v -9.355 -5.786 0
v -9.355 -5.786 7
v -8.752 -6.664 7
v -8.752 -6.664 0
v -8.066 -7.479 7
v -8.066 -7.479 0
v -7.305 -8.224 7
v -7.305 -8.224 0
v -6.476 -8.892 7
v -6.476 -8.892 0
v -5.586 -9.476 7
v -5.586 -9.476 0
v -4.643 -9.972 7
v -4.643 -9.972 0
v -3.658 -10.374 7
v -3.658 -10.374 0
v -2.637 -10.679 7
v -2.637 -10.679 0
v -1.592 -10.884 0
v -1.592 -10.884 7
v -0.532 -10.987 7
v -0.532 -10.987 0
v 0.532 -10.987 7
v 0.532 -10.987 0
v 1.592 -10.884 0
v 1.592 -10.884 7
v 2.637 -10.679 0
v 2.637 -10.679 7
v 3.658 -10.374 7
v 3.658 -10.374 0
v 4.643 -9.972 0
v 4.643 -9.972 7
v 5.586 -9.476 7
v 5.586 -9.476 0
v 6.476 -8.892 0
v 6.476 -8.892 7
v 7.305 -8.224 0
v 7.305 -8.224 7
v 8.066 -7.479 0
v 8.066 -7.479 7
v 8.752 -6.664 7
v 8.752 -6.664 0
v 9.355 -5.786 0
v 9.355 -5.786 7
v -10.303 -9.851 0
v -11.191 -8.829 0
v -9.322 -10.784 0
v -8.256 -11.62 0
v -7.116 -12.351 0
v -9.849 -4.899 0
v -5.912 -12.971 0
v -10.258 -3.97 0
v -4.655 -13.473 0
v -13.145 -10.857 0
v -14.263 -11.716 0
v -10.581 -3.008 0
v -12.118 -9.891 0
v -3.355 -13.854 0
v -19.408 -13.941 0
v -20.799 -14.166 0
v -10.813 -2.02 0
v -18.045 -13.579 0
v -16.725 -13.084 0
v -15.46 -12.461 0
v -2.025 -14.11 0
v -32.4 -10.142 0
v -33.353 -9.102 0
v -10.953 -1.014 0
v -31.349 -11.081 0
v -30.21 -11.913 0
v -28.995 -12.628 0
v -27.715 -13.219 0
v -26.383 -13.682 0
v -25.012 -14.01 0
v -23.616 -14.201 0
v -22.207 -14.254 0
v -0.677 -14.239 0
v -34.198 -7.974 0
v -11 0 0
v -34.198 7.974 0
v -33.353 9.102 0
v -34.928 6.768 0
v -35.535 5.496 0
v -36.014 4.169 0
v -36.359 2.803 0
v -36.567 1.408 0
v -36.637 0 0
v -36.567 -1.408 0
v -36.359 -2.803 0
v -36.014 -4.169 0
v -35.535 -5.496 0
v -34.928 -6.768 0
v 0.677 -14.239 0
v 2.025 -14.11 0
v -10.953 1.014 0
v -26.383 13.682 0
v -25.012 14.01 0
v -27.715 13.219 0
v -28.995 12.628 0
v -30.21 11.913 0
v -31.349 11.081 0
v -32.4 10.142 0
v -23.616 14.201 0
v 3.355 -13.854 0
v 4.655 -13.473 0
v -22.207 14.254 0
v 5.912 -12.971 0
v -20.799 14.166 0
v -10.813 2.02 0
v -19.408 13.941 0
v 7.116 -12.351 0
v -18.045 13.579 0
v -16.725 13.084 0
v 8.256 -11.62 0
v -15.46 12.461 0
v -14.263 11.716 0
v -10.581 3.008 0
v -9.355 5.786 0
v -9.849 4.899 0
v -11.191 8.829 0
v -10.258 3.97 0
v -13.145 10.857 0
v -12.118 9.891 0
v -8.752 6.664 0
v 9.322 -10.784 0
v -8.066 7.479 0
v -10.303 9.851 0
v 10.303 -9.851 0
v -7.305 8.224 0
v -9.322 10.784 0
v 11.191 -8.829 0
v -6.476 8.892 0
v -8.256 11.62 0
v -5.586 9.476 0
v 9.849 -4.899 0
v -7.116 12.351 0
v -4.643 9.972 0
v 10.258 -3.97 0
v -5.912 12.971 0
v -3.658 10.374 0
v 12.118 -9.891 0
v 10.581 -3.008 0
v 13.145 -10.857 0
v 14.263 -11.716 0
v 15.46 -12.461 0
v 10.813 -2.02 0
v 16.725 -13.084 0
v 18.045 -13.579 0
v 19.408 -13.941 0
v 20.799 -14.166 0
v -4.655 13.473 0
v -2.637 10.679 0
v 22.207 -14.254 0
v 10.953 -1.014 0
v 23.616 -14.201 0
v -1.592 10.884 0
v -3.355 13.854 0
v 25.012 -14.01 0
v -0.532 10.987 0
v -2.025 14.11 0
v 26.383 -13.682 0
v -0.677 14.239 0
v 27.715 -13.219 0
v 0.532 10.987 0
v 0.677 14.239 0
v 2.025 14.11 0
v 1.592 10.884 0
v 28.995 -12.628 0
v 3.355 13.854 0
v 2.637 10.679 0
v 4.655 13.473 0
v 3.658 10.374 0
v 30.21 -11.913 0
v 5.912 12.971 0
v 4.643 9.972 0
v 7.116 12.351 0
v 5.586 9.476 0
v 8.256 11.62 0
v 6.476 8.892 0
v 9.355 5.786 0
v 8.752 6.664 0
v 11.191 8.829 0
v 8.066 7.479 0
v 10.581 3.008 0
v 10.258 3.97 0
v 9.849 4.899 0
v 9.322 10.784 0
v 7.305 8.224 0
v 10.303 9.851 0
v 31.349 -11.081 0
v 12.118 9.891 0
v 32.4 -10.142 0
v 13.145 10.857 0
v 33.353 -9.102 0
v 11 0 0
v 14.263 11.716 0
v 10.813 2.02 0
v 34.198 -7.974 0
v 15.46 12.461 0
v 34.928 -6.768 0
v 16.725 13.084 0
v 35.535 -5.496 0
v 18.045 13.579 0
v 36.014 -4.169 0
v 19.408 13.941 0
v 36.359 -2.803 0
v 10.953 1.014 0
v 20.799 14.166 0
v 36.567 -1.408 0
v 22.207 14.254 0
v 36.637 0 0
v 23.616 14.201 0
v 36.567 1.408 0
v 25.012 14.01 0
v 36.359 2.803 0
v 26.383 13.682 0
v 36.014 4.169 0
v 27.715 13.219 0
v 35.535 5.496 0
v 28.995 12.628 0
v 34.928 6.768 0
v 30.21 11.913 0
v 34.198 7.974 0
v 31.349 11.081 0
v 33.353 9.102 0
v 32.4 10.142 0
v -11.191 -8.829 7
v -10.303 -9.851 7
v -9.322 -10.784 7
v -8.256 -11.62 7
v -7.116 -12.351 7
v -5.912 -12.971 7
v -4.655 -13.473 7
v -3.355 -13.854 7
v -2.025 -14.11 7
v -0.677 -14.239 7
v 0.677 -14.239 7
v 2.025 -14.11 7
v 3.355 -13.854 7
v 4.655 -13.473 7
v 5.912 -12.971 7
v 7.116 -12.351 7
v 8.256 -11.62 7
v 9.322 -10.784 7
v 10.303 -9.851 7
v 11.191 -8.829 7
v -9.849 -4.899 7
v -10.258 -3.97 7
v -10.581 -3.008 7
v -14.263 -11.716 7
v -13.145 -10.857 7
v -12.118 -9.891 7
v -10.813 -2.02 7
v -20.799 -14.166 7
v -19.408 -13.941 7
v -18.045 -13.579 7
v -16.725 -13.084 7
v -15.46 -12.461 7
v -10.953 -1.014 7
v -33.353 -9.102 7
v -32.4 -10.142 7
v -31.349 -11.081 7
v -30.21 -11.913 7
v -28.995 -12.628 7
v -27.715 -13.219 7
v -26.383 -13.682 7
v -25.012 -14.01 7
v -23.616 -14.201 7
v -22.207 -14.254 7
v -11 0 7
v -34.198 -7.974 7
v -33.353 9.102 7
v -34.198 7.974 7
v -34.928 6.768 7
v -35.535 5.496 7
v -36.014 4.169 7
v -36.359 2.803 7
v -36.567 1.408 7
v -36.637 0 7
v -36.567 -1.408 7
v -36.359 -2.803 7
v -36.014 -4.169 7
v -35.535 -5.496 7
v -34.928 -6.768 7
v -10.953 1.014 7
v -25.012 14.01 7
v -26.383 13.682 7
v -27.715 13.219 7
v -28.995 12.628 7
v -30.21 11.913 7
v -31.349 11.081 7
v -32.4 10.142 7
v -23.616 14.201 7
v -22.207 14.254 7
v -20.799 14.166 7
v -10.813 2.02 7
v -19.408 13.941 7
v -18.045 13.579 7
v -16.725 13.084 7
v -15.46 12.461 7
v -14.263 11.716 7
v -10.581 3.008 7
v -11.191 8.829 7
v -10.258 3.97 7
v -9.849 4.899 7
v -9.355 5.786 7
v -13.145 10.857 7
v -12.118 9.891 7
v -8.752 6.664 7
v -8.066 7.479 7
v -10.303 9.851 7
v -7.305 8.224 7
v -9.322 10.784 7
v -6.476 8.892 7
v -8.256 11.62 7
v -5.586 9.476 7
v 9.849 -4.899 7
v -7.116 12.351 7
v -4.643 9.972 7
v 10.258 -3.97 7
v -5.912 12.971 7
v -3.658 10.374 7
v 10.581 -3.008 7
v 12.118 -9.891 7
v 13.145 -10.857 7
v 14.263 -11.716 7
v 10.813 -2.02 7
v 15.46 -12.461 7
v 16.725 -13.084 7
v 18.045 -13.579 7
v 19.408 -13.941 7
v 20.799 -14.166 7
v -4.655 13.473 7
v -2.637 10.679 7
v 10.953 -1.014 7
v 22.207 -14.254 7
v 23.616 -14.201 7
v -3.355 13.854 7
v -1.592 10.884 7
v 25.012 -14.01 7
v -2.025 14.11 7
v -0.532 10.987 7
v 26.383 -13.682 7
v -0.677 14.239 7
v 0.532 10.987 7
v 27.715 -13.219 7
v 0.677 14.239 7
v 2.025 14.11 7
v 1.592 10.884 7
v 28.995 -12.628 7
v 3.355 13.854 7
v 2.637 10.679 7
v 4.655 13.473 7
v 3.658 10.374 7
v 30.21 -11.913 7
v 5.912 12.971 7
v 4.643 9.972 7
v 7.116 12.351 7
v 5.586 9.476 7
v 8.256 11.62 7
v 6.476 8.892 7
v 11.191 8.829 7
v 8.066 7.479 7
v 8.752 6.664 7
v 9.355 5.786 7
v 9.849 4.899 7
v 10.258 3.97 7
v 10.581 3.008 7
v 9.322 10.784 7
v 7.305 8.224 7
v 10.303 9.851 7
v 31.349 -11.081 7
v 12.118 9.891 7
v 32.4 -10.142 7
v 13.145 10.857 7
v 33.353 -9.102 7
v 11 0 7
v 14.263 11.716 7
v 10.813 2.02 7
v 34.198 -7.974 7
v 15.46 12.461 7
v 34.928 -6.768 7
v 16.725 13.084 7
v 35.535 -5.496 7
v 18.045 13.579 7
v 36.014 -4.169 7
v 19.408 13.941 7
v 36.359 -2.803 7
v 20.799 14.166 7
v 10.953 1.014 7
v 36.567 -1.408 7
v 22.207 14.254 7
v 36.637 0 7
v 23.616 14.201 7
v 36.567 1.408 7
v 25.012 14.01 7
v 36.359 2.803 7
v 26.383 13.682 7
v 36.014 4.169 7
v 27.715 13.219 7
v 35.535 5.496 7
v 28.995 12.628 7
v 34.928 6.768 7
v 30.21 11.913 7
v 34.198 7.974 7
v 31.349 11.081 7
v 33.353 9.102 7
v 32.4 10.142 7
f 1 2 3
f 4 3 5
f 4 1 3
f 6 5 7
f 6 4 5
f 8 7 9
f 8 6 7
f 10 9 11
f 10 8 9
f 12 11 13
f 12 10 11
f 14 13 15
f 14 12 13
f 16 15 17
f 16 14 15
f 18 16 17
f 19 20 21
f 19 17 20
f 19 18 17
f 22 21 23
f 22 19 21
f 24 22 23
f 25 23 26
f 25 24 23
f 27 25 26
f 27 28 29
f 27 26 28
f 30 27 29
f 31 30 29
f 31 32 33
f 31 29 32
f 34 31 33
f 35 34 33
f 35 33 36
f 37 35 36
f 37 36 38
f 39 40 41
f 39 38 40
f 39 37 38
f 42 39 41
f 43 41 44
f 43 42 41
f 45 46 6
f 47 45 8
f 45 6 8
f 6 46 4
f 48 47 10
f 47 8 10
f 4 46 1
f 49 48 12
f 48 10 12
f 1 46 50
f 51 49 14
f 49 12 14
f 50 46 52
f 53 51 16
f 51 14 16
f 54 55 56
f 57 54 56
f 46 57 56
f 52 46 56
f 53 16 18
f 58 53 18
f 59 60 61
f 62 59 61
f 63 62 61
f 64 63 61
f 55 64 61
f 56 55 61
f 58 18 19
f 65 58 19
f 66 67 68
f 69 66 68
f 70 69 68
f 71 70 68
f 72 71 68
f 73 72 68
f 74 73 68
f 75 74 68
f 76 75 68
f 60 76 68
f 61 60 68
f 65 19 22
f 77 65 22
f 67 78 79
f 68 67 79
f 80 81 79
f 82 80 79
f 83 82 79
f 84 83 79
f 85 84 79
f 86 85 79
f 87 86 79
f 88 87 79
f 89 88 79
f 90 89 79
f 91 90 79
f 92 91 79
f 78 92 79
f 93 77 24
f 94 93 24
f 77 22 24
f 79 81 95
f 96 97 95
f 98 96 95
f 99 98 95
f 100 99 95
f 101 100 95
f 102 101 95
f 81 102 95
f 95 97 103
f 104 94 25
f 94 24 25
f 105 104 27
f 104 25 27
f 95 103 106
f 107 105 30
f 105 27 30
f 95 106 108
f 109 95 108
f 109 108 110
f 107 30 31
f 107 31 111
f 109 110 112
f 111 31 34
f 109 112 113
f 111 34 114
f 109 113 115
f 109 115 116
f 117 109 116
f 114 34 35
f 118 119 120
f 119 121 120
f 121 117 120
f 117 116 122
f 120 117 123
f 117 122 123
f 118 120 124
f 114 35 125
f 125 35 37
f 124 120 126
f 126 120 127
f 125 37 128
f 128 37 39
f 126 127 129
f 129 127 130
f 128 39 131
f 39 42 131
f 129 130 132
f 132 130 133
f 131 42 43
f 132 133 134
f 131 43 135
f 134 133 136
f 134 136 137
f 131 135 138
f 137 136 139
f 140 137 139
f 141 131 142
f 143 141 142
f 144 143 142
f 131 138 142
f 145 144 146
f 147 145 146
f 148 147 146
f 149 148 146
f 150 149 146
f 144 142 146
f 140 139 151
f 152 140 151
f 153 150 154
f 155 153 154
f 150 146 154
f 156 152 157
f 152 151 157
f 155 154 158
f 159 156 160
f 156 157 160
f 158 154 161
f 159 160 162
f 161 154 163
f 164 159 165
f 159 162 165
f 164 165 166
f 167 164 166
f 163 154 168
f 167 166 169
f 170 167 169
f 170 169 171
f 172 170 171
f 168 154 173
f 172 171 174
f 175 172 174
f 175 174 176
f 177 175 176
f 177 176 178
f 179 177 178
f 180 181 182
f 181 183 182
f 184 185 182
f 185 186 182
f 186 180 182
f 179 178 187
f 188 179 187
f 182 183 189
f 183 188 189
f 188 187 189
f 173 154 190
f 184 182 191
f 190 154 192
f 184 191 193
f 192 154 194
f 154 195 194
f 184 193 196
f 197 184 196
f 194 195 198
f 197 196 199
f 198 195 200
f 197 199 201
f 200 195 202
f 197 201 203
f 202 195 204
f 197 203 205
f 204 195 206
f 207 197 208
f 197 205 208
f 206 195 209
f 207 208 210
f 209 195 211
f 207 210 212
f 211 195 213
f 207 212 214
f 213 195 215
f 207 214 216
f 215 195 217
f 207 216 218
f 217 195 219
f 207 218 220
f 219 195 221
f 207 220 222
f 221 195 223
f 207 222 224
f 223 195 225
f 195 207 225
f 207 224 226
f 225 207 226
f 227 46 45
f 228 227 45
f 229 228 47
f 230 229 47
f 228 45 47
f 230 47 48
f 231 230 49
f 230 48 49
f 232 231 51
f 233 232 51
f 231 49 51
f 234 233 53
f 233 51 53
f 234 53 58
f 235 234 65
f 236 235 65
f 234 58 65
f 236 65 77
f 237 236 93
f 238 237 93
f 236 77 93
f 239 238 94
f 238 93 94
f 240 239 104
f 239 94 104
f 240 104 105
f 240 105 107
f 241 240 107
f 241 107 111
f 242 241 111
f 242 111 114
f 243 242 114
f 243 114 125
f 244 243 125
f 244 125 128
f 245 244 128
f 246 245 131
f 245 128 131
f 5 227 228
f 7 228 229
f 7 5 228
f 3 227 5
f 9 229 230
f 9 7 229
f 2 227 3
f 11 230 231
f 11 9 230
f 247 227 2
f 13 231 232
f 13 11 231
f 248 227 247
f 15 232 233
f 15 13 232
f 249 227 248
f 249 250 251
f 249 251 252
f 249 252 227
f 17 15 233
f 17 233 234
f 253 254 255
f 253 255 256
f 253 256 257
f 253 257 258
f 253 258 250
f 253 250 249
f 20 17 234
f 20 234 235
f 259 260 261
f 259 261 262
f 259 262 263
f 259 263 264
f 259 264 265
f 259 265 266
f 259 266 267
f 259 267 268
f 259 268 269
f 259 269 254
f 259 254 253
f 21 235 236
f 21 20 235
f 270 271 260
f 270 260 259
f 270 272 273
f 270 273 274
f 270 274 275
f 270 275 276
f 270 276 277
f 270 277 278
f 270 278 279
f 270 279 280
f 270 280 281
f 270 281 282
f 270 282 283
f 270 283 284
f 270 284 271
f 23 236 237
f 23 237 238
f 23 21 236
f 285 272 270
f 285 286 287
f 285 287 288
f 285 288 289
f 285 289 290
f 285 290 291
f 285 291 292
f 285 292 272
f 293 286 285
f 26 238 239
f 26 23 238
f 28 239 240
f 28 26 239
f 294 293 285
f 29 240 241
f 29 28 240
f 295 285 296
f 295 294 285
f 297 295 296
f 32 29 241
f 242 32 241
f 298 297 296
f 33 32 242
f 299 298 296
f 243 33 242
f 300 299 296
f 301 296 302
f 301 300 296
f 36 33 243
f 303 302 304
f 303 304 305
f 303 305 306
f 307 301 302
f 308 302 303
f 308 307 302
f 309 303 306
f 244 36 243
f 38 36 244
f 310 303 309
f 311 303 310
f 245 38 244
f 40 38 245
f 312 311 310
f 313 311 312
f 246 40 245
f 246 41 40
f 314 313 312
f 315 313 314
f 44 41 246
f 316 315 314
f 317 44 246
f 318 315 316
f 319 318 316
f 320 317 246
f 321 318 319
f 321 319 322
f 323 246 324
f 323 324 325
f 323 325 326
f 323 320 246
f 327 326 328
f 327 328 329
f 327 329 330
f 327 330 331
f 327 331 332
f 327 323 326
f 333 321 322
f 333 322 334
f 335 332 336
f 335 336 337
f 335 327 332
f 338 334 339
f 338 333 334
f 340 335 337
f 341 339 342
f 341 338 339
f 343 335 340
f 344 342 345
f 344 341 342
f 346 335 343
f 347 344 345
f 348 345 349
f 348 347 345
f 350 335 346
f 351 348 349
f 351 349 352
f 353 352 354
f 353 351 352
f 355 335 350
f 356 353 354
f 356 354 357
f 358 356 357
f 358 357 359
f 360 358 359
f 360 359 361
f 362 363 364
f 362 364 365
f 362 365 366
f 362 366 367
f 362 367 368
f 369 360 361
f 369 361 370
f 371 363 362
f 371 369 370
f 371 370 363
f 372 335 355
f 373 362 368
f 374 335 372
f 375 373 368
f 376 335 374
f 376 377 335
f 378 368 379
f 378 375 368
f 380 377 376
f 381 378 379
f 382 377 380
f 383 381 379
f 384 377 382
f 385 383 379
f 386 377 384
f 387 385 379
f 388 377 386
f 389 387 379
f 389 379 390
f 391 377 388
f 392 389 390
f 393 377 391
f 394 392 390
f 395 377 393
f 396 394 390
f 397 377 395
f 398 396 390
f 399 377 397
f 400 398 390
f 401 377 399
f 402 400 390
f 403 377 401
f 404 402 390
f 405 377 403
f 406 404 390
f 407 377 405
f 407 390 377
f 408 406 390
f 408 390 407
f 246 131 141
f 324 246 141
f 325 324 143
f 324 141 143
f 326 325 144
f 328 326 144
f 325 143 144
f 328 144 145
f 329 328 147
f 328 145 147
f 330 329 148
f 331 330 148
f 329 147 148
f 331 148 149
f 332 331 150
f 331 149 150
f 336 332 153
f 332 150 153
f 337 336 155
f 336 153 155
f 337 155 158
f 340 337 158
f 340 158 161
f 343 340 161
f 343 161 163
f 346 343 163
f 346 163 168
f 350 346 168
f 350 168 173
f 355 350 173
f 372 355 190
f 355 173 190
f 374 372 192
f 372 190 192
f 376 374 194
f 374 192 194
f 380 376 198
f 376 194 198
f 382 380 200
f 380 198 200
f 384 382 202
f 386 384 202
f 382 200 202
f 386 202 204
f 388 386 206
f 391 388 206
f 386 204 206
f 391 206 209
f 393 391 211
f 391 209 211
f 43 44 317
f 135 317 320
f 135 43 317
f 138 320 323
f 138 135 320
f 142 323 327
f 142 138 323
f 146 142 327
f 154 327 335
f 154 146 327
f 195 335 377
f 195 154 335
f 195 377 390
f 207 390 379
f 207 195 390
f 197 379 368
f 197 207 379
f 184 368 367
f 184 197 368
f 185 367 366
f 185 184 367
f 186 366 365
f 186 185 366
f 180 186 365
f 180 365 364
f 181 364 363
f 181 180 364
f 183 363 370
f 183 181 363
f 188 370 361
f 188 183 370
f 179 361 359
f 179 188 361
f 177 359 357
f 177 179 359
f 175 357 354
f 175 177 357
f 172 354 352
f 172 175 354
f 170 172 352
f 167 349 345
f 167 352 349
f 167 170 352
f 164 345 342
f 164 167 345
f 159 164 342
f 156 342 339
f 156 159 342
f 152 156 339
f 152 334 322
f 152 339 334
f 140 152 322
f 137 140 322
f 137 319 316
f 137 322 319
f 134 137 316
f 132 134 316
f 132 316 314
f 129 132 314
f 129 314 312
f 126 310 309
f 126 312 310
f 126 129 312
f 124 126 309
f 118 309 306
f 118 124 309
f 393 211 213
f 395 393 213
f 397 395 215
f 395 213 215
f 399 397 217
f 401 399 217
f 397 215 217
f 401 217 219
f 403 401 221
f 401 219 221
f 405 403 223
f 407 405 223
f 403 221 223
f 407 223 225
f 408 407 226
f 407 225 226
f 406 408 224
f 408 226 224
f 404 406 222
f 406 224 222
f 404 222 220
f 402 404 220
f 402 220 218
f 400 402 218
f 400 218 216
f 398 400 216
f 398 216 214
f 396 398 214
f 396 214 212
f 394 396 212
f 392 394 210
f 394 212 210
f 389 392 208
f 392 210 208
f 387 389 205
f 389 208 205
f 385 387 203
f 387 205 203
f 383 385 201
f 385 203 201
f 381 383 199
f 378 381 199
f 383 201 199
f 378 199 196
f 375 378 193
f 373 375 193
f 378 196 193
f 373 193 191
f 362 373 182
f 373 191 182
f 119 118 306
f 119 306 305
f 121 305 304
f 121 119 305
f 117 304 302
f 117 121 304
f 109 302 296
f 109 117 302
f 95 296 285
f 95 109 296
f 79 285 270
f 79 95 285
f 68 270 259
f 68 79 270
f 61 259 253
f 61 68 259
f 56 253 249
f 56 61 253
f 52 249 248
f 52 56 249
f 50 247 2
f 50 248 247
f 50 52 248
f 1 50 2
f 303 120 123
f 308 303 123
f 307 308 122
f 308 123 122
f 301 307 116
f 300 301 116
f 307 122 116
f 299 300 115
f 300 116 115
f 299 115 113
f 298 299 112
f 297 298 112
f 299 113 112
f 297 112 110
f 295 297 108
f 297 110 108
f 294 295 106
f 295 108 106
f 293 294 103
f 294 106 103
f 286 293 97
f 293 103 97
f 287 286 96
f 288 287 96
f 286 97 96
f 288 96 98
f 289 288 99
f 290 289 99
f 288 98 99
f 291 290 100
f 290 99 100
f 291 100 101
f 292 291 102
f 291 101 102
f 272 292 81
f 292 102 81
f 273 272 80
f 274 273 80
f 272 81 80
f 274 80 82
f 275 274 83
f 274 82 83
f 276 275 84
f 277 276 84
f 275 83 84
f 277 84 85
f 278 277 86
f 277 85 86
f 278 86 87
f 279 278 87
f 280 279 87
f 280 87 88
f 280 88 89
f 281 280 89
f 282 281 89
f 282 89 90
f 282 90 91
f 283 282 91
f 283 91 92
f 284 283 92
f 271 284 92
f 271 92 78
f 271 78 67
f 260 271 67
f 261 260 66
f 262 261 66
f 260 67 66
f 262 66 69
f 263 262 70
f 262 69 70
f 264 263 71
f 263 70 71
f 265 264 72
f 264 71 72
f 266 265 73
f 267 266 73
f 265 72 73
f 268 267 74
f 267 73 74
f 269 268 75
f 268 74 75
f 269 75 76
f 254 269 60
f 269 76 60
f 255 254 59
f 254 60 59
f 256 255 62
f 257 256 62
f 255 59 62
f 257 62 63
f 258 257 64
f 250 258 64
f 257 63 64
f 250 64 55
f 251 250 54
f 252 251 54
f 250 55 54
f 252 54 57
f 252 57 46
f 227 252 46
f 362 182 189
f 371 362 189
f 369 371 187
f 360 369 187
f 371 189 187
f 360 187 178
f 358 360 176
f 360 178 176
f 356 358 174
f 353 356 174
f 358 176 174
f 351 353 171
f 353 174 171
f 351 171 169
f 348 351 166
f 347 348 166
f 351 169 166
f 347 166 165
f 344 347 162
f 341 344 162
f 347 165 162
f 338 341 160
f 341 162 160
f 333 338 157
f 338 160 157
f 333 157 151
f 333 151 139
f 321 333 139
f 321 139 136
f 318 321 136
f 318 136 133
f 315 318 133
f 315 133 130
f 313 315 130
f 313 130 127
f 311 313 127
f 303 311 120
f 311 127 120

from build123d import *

# Parameters (mm, degrees)
F1_DEPTH = 7
F2_DEPTH = 25


with BuildPart() as f1:
    # F0 (on Top) → F1 (new body)
    with BuildSketch(Plane.XY):
        with BuildLine():
            ThreePointArc((11.1912532195, 8.8289930758), (13.467047778, 4.6726749835), (14.2546577425, 0))
            ThreePointArc((14.2546577425, 0), (13.467047778, -4.6726749835), (11.1912532195, -8.8289930758))
            ThreePointArc((11.1912532195, -8.8289930758), (27.0551814224, -13.467047778), (36.6371641815, 0))
            ThreePointArc((36.6371641815, 0), (27.0551814224, 13.467047778), (11.1912532195, 8.8289930758))
        make_face()
        with BuildLine():
            ThreePointArc((11, 0), (10.5807877336, 3.0078116524), (9.3551034661, 5.7863666613))
            ThreePointArc((9.3551034661, 5.7863666613), (8.1278486965, 0), (9.3551034661, -5.7863666613))
            ThreePointArc((9.3551034661, -5.7863666613), (10.5807877336, -3.0078116524), (11, 0))
        make_face()
        with BuildLine():
            ThreePointArc((-11.1912532195, -8.8289930758), (-14.2546577425, 0), (-11.1912532195, 8.8289930758))
            ThreePointArc((-11.1912532195, 8.8289930758), (-36.6371641815, 0), (-11.1912532195, -8.8289930758))
        make_face()
        with BuildLine():
            ThreePointArc((-8.1278486965, 0), (-8.4380373202, 2.9575409299), (-9.3551034661, 5.7863666613))
            ThreePointArc((-9.3551034661, 5.7863666613), (-11, 0), (-9.3551034661, -5.7863666613))
            ThreePointArc((-9.3551034661, -5.7863666613), (-8.4380373202, -2.9575409299), (-8.1278486965, 0))
        make_face()
        with BuildLine():
            ThreePointArc((9.3551034661, 5.7863666613), (10.1779900284, 7.3651236609), (11.1912532195, 8.8289930758))
            ThreePointArc((11.1912532195, 8.8289930758), (0, 14.2546577425), (-11.1912532195, 8.8289930758))
            ThreePointArc((-11.1912532195, 8.8289930758), (-10.1779900284, 7.3651236609), (-9.3551034661, 5.7863666613))
            ThreePointArc((-9.3551034661, 5.7863666613), (0, 11), (9.3551034661, 5.7863666613))
        make_face()
        with BuildLine():
            ThreePointArc((-11.1912532195, -8.8289930758), (0, -14.2546577425), (11.1912532195, -8.8289930758))
            ThreePointArc((11.1912532195, -8.8289930758), (10.1779900284, -7.3651236609), (9.3551034661, -5.7863666613))
            ThreePointArc((9.3551034661, -5.7863666613), (0, -11), (-9.3551034661, -5.7863666613))
            ThreePointArc((-9.3551034661, -5.7863666613), (-10.1779900284, -7.3651236609), (-11.1912532195, -8.8289930758))
        make_face()
        with BuildLine():
            ThreePointArc((-9.3551034661, 5.7863666613), (-10.1779900284, 7.3651236609), (-11.1912532195, 8.8289930758))
            ThreePointArc((-11.1912532195, 8.8289930758), (-14.2546577425, 0), (-11.1912532195, -8.8289930758))
            ThreePointArc((-11.1912532195, -8.8289930758), (-10.1779900284, -7.3651236609), (-9.3551034661, -5.7863666613))
            ThreePointArc((-9.3551034661, -5.7863666613), (-11, 0), (-9.3551034661, 5.7863666613))
        make_face()
        with BuildLine():
            ThreePointArc((11.1912532195, -8.8289930758), (13.467047778, -4.6726749835), (14.2546577425, 0))
            ThreePointArc((14.2546577425, 0), (13.467047778, 4.6726749835), (11.1912532195, 8.8289930758))
            ThreePointArc((11.1912532195, 8.8289930758), (10.1779900284, 7.3651236609), (9.3551034661, 5.7863666613))
            ThreePointArc((9.3551034661, 5.7863666613), (10.5807877336, 3.0078116524), (11, 0))
            ThreePointArc((11, 0), (10.5807877336, -3.0078116524), (9.3551034661, -5.7863666613))
            ThreePointArc((9.3551034661, -5.7863666613), (10.1779900284, -7.3651236609), (11.1912532195, -8.8289930758))
        make_face()
        with BuildLine():
            ThreePointArc((9.3551034661, -5.7863666613), (8.1278486965, 0), (9.3551034661, 5.7863666613))
            ThreePointArc((9.3551034661, 5.7863666613), (0, 11), (-9.3551034661, 5.7863666613))
            ThreePointArc((-9.3551034661, 5.7863666613), (-8.4380373202, 2.9575409299), (-8.1278486965, 0))
            ThreePointArc((-8.1278486965, 0), (-8.4380373202, -2.9575409299), (-9.3551034661, -5.7863666613))
            ThreePointArc((-9.3551034661, -5.7863666613), (0, -11), (9.3551034661, -5.7863666613))
        make_face()
    extrude(amount=F1_DEPTH)

    # F0 (on Top) → F2 (cut)
    with BuildSketch(Plane.XY):
        with BuildLine():
            ThreePointArc((9.3551034661, -5.7863666613), (8.1278486965, 0), (9.3551034661, 5.7863666613))
            ThreePointArc((9.3551034661, 5.7863666613), (0, 11), (-9.3551034661, 5.7863666613))
            ThreePointArc((-9.3551034661, 5.7863666613), (-8.4380373202, 2.9575409299), (-8.1278486965, 0))
            ThreePointArc((-8.1278486965, 0), (-8.4380373202, -2.9575409299), (-9.3551034661, -5.7863666613))
            ThreePointArc((-9.3551034661, -5.7863666613), (0, -11), (9.3551034661, -5.7863666613))
        make_face()
        with BuildLine():
            ThreePointArc((-8.1278486965, 0), (-8.4380373202, 2.9575409299), (-9.3551034661, 5.7863666613))
            ThreePointArc((-9.3551034661, 5.7863666613), (-11, 0), (-9.3551034661, -5.7863666613))
            ThreePointArc((-9.3551034661, -5.7863666613), (-8.4380373202, -2.9575409299), (-8.1278486965, 0))
        make_face()
        with BuildLine():
            ThreePointArc((11, 0), (10.5807877336, 3.0078116524), (9.3551034661, 5.7863666613))
            ThreePointArc((9.3551034661, 5.7863666613), (8.1278486965, 0), (9.3551034661, -5.7863666613))
            ThreePointArc((9.3551034661, -5.7863666613), (10.5807877336, -3.0078116524), (11, 0))
        make_face()
    extrude(amount=F2_DEPTH, mode=Mode.SUBTRACT)


solid = f1.part
